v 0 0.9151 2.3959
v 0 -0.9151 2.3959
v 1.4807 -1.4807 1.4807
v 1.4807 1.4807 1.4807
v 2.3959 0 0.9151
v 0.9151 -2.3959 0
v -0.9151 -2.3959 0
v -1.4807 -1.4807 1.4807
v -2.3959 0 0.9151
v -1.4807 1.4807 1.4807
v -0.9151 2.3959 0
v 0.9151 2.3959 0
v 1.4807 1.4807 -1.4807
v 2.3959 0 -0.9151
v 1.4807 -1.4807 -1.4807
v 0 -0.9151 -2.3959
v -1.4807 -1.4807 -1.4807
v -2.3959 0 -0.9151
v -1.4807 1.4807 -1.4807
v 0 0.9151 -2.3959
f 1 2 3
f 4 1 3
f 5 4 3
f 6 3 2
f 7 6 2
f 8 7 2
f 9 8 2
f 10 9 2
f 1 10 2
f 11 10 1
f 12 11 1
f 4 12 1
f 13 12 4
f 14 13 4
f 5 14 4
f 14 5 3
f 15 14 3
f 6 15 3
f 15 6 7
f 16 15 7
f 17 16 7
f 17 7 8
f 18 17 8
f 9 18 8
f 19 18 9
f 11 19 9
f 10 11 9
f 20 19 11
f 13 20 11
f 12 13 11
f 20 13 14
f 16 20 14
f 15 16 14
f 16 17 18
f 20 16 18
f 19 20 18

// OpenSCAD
// file: ../maths_geodesic.scad
/*
	License: This code is placed in the public Domain
	Contributed By: Willliam A Adams
	August 2011
*/

// A couple of useful constants
Cpi = 3.14159;
Cphi = 1.61803399;
Cepsilon = 0.00000001;

 
// Function: clean
//
// Parameters:
//	n - A number that might be very close to zero
// Description:  
//	There are times when you want a very small number to 
// 	just be zero, instead of being that very small number.
//	This function will compare the number to an arbitrarily small 
//	number.  If it is smaller than the 'epsilon', then zero will be 
// 	returned.  Otherwise, the original number will be returned.
//

function clean(n) = (n < 0) ? ((n < -Cepsilon) ? n : 0) : 
	(n < Cepsilon) ? 0 : n; 

// Function: safediv
//
// Parameters
//	n - The numerator
//	d - The denominator
//
// Description:
//	Since division by zero is generally not a desirable thing, safediv
//	will return '0' whenever there is a division by zero.  Although this will
//	mask some erroneous division by zero errors, it is often the case
//	that you actually want this behavior.  So, it makes it convenient.
function safediv(n,d) = (d==0) ? 0 : n/d;


//==================================
// Degrees
//==================================

function DEGREES(radians) = (180/Cpi) * radians;

function RADIANS(degrees) = Cpi/180 * degrees;

function deg(deg, min=0, sec=0) = [deg, min, sec];

function deg_to_dec(d) = d[0] + d[1]/60 + d[2]/60/60;


//==================================
//  Spherical coordinates
//==================================

// create an instance of a spherical coordinate
// long - rotation around z -axis
// lat - latitude, starting at 0 == 'north pole'
// rad - distance from center
function sph(long, lat, rad=1) = [long, lat, rad];

// Convert spherical to cartesian
//function sph_to_cart(s) = [
//	clean(s[2]*sin(s[1])*cos(s[0])),  
//	clean(s[2]*sin(s[1])*sin(s[0])),
//	clean(s[2]*cos(s[1]))
//	];

function sph_to_cart(s) = [
	clean(s[2]*sin(s[1])*cos(s[0])),  

	clean(s[2]*sin(s[1])*sin(s[0])),

	clean(s[2]*cos(s[1]))
	];

// Convert from cartesian to spherical
function sph_from_cart(c) = sph(
	atan2(c[1],c[0]), 
	atan2(sqrt(c[0]*c[0]+c[1]*c[1]), c[2]), 
	sqrt(c[0]*c[0]+c[1]*c[1]+c[2]*c[2])
	);

function sphu_from_cart(c, rad=1) = sph(
	atan2(c[1],c[0]), 
	atan2(sqrt(c[0]*c[0]+c[1]*c[1]), c[2]), 
	rad
	);

// compute the chord distance between two points on a sphere
function sph_dist(c1, c2) = sqrt(
	c1[2]*c1[2] + c2[2]*c2[2] - 
	2*c1[2]*c2[2]*
	((cos(c1[1])*cos(c2[1])) + cos(c1[0]-c2[0])*sin(c1[1])*sin(c2[1]))   
	);


//==========================================
//	Geodesic calculations
// 
//  Reference: Geodesic Math and How to Use It
//  By: Hugh Kenner
//  Second Paperback Edition (2003), p.74-75
//  http://www.amazon.com/Geodesic-Math-How-Hugh-Kenner/dp/0520239318
//
//  The book was used for reference, so if you want to check the math, 
//  you can plug in various numbers to various routines and see if you get
//  the same numbers in the book.
//
//  In general, there are enough routines here to implement the various
//  pieces necessary to make geodesic objects.
//==========================================

function poly_sum_interior_angles(sides) = (sides-2)*180;
function poly_single_interior_angle(pq) = poly_sum_interior_angles(pq[0])/pq[0];

// Calculate angular deficiency of each vertex in a platonic solid
// p - sides
// q - number of edges per vertex
function angular_defect(pq) = 360 - (poly_single_interior_angle(pq)*pq[1]);
function plat_deficiency(pq) = DEGREES(2*Cpi - pq[1]*Cpi*(1-2/pq[0]));

function plat_dihedral(pq) = 2 * asin( cos(180/pq[1])/sin(180/pq[0]));


// Given a set of coordinates, return the frequency
// Simply calculated by adding up the values of the coordinates
function geo_freq(xyz) = xyz[0]+xyz[1]+xyz[2];

// Convert between the 2D coordinates of vertices on the face triangle
// to the 3D vertices needed to calculate spherical coordinates
function geo_tri2_tri3(xyf) = [xyf[1], xyf[0]-xyf[1], xyf[2]-xyf[0]];

// Given coordinates for a vertex on the octahedron face
// return the spherical coordinates for the vertex
// class 1, method 1
function octa_class1(c) = sph(
	atan(safediv(c[0], c[1])),
	atan(sqrt(c[0]*c[0]+c[1]*c[1])/c[2]),
	1 
	);

function octa_class2(c) = sph(
	atan(c[0]/c[1]),
	atan( sqrt( 2*(c[0]*c[0]+c[1]*c[1])) /c[2]),
	1 
	);

function icosa_class1(c) = octa_class1(
	[
		c[0]*sin(72),  
		c[1]+c[0]*cos(72),  
		geo_freq(c)/2+c[2]/Cphi
	]);

function icosa_class2(c) = sph(
	atan([c0]/c[1]), 
	atan(sqrt(c[0]*c[0]+c[1]*c[1]))/cos(36)*c[2],
	1
	);
 
function tetra_class1(c) = octa_class1(
	[
		sqrt(3*c[0]),  
		2*c[1]-c[0],  
		(3*c[2]-c[0]-c[1])/sqrt(2)
	]);

function class1_icosa_chord_factor(v1, v2, freq) = sph_dist( 
		icosa_class1(geo_tri2_tri3( [v1[0], v1[1], freq])),
		icosa_class1(geo_tri2_tri3( [v2[0], v2[1], freq]))
	);
// file: ../platonic.scad
include <maths_geodesic.scad>


// Information about platonic solids 
// This information is useful in constructing the various solids
// can be found here: http://en.wikipedia.org/wiki/Platonic_solid
// V - vertices
// E - edges
// F - faces
// number, V, E, F, schlafli symbol, dihedral angle, element, name
//tetrahedron = [1, 4, 6, 4, [3,3], 70.5333, "fire", "tetrahedron"];
//hexahedron = [2, 8, 12, 6, [4,3], 90, "earth", "cube"];
//octahedron = [3, 6, 12, 8, [3,4], 109.467, "air", "air"];
//dodecahedron = [4, 20, 30, 12, [5,3], 116.565, "ether", "universe"];
//icosahedron = [5, 12, 30, 20, [3,5], 138.190, "water", "water"];


//================================================
//	Tetrahedron
//================================================
tetra_cart = [
	[+1, +1, +1],
	[-1, -1, +1],
	[-1, +1, -1],
	[+1, -1, -1]
];

function tetra_unit(rad=1) = [
	sph_to_cart(sphu_from_cart(tetra_cart[0], rad)), 
	sph_to_cart(sphu_from_cart(tetra_cart[1], rad)),
	sph_to_cart(sphu_from_cart(tetra_cart[2], rad)),
	sph_to_cart(sphu_from_cart(tetra_cart[3], rad)),
	];


tetrafaces = [
	[0, 3, 1],
	[0,1,2],
	[2,1,3],
	[0,2,3]
];

function tetrahedron(rad=1) = [tetra_unit(rad), tetrafaces];


//================================================
//	Hexahedron - Cube 
//================================================
// vertices for a unit cube with sides of length 1
hexa_cart = [
	[0.5, 0.5, 0.5], 
	[-0.5, 0.5, 0.5], 
	[-0.5, -0.5, 0.5], 
	[0.5, -0.5, 0.5],
	[0.5, 0.5, -0.5], 
	[-0.5, 0.5, -0.5], 
	[-0.5, -0.5, -0.5], 
	[0.5, -0.5, -0.5],
];

function hexa_unit(rad=1) = [
	sph_to_cart(sphu_from_cart(hexa_cart[0], rad)), 
	sph_to_cart(sphu_from_cart(hexa_cart[1], rad)),
	sph_to_cart(sphu_from_cart(hexa_cart[2], rad)),
	sph_to_cart(sphu_from_cart(hexa_cart[3], rad)),
	sph_to_cart(sphu_from_cart(hexa_cart[4], rad)), 
	sph_to_cart(sphu_from_cart(hexa_cart[5], rad)), 
	sph_to_cart(sphu_from_cart(hexa_cart[6], rad)),
	sph_to_cart(sphu_from_cart(hexa_cart[7], rad)),
	];


// enumerate the faces of a cube
// vertex order is clockwise winding
hexafaces = [
	[0,3,2,1],	// top
	[0,1,5,4],
	[1,2,6,5],
	[2,3,7,6],
	[3,0,4,7],
	[4,5,6,7],	// bottom
];

function hexahedron(rad=1) =[hexa_unit(rad), hexafaces];


//================================================
//	Octahedron 
//================================================

octa_cart = [
	[+1, 0, 0],  // + x axis
	[-1, 0, 0],	// - x axis
	[0, +1, 0],	// + y axis
	[0, -1, 0],	// - y axis
	[0, 0, +1],	// + z axis
	[0, 0, -1] 	// - z axis
];

function octa_unit(rad=1) = [
	sph_to_cart(sphu_from_cart(octa_cart[0], rad)), 
	sph_to_cart(sphu_from_cart(octa_cart[1], rad)),
	sph_to_cart(sphu_from_cart(octa_cart[2], rad)),
	sph_to_cart(sphu_from_cart(octa_cart[3], rad)),
	sph_to_cart(sphu_from_cart(octa_cart[4], rad)), 
	sph_to_cart(sphu_from_cart(octa_cart[5], rad)), 
	];

octafaces = [
	[4,2,0],
	[4,0,3],
	[4,3,1],
	[4,1,2],
	[5,0,2],
	[5,3,0],
	[5,1,3],
	[5,2,1]
	];

function octahedron(rad=1) = [octa_unit(rad), octafaces];

//================================================
//	Dodecahedron
//================================================
// (+-1, +-1, +-1)
// (0, +-1/Cphi, +-Cphi)
// (+-1/Cphi, +-Cphi, 0)
// (+-Cphi, 0, +-1/Cphi)

dodeca_cart = [
	[+1, +1, +1],			// 0, 0
	[+1, -1, +1],			// 0, 1
	[-1, -1, +1],			// 0, 2
	[-1, +1, +1],			// 0, 3

	[+1, +1, -1],			// 1, 4
	[-1, +1, -1],			// 1, 5
	[-1, -1, -1],			// 1, 6
	[+1, -1, -1],			// 1, 7

	[0, +1/Cphi, +Cphi],		// 2, 8
	[0, -1/Cphi, +Cphi],		// 2, 9
	[0, -1/Cphi, -Cphi],		// 2, 10
	[0, +1/Cphi, -Cphi],		// 2, 11

	[-1/Cphi, +Cphi, 0],		// 3, 12
	[+1/Cphi, +Cphi, 0],		// 3, 13
	[+1/Cphi, -Cphi, 0],		// 3, 14
	[-1/Cphi, -Cphi, 0],		// 3, 15

	[-Cphi, 0, +1/Cphi],		// 4, 16
	[+Cphi, 0, +1/Cphi],		// 4, 17
	[+Cphi, 0, -1/Cphi],		// 4, 18
	[-Cphi, 0, -1/Cphi],		// 4, 19
];

function dodeca_unit(rad=1) = [
	sph_to_cart(sphu_from_cart(dodeca_cart[0], rad)), 
	sph_to_cart(sphu_from_cart(dodeca_cart[1], rad)),
	sph_to_cart(sphu_from_cart(dodeca_cart[2], rad)),
	sph_to_cart(sphu_from_cart(dodeca_cart[3], rad)),
	sph_to_cart(sphu_from_cart(dodeca_cart[4], rad)), 
	sph_to_cart(sphu_from_cart(dodeca_cart[5], rad)), 
	sph_to_cart(sphu_from_cart(dodeca_cart[6], rad)),
	sph_to_cart(sphu_from_cart(dodeca_cart[7], rad)),
	sph_to_cart(sphu_from_cart(dodeca_cart[8], rad)),
	sph_to_cart(sphu_from_cart(dodeca_cart[9], rad)), 
	sph_to_cart(sphu_from_cart(dodeca_cart[10], rad)), 
	sph_to_cart(sphu_from_cart(dodeca_cart[11], rad)),
	sph_to_cart(sphu_from_cart(dodeca_cart[12], rad)),
	sph_to_cart(sphu_from_cart(dodeca_cart[13], rad)),
	sph_to_cart(sphu_from_cart(dodeca_cart[14], rad)), 
	sph_to_cart(sphu_from_cart(dodeca_cart[15], rad)), 
	sph_to_cart(sphu_from_cart(dodeca_cart[16], rad)),
	sph_to_cart(sphu_from_cart(dodeca_cart[17], rad)),
	sph_to_cart(sphu_from_cart(dodeca_cart[18], rad)),
	sph_to_cart(sphu_from_cart(dodeca_cart[19], rad)), 
	];



dodecafaces=[ 
	[1,9,8,0,17],
	[9,1,14,15,2],
	[9,2,16,3,8],
	[8,3,12,13,0],
	[0,13,4,18,17],
	[1,17,18,7,14],
	[15,14,7,10,6],
	[2,15,6,19,16],
	[16,19,5,12,3],
	[12,5,11,4,13],
	[18,4,11,10,7],
	[19,6,10,11,5]
	];

function dodecahedron(rad=1) = [dodeca_unit(rad), dodecafaces];

//================================================
//	Icosahedron
//================================================
//
// (0, +-1, +-Cphi)
// (+-Cphi, 0, +-1)
// (+-1, +-Cphi, 0)

icosa_cart = [
	[0, +1, +Cphi],	// 0
	[0, +1, -Cphi],	// 1
	[0, -1, -Cphi],	// 2
	[0, -1, +Cphi],	// 3

	[+Cphi, 0, +1],	// 4
	[+Cphi, 0, -1],	// 5
	[-Cphi, 0, -1],	// 6
	[-Cphi, 0, +1],	// 7

	[+1, +Cphi, 0],	// 8
	[+1, -Cphi, 0],	// 9
	[-1, -Cphi, 0],	// 10
	[-1, +Cphi, 0]	// 11
	];

function icosa_unit(rad=1) = [
	sph_to_cart(sphu_from_cart(icosa_cart[0], rad)), 
	sph_to_cart(sphu_from_cart(icosa_cart[1], rad)),
	sph_to_cart(sphu_from_cart(icosa_cart[2], rad)),
	sph_to_cart(sphu_from_cart(icosa_cart[3], rad)),
	sph_to_cart(sphu_from_cart(icosa_cart[4], rad)), 
	sph_to_cart(sphu_from_cart(icosa_cart[5], rad)), 
	sph_to_cart(sphu_from_cart(icosa_cart[6], rad)),
	sph_to_cart(sphu_from_cart(icosa_cart[7], rad)),
	sph_to_cart(sphu_from_cart(icosa_cart[8], rad)),
	sph_to_cart(sphu_from_cart(icosa_cart[9], rad)), 
	sph_to_cart(sphu_from_cart(icosa_cart[10], rad)), 
	sph_to_cart(sphu_from_cart(icosa_cart[11], rad)),
	];

icosafaces = [ 
	[3,0,4],
	[3,4,9],
	[3,9,10],
	[3,10,7],
	[3,7,0],
	[0,8,4],
	[0,7,11],
	[0,11,8],
	[4,8,5],
	[4,5,9],
	[7,10,6],
	[7,6,11],
	[9,5,2],
	[9,2,10],
	[2,6,10],
	[1,5,8],
	[1,8,11],
	[1,11,6],
	[5,1,2],
	[2,1,6]
	];

function icosahedron(rad=1) = [icosa_unit(rad), icosafaces];
// main file
// file autogenerated by create_poly_array.py
// author: thanasi athanassiadis (thanasi@uchicago.edu)
// august 25, 2012

include <../platonic.scad>

// units are mm

rad = 2.564680;

poly = dodecahedron(rad);

for(i = [ [0.000000,0.000000,0.000000] ])
{
    translate(i)
    display_polyhedron(poly);
}

module display_polyhedron(poly) 
{
polyhedron(points = poly[0], triangles = poly[1]);
}
